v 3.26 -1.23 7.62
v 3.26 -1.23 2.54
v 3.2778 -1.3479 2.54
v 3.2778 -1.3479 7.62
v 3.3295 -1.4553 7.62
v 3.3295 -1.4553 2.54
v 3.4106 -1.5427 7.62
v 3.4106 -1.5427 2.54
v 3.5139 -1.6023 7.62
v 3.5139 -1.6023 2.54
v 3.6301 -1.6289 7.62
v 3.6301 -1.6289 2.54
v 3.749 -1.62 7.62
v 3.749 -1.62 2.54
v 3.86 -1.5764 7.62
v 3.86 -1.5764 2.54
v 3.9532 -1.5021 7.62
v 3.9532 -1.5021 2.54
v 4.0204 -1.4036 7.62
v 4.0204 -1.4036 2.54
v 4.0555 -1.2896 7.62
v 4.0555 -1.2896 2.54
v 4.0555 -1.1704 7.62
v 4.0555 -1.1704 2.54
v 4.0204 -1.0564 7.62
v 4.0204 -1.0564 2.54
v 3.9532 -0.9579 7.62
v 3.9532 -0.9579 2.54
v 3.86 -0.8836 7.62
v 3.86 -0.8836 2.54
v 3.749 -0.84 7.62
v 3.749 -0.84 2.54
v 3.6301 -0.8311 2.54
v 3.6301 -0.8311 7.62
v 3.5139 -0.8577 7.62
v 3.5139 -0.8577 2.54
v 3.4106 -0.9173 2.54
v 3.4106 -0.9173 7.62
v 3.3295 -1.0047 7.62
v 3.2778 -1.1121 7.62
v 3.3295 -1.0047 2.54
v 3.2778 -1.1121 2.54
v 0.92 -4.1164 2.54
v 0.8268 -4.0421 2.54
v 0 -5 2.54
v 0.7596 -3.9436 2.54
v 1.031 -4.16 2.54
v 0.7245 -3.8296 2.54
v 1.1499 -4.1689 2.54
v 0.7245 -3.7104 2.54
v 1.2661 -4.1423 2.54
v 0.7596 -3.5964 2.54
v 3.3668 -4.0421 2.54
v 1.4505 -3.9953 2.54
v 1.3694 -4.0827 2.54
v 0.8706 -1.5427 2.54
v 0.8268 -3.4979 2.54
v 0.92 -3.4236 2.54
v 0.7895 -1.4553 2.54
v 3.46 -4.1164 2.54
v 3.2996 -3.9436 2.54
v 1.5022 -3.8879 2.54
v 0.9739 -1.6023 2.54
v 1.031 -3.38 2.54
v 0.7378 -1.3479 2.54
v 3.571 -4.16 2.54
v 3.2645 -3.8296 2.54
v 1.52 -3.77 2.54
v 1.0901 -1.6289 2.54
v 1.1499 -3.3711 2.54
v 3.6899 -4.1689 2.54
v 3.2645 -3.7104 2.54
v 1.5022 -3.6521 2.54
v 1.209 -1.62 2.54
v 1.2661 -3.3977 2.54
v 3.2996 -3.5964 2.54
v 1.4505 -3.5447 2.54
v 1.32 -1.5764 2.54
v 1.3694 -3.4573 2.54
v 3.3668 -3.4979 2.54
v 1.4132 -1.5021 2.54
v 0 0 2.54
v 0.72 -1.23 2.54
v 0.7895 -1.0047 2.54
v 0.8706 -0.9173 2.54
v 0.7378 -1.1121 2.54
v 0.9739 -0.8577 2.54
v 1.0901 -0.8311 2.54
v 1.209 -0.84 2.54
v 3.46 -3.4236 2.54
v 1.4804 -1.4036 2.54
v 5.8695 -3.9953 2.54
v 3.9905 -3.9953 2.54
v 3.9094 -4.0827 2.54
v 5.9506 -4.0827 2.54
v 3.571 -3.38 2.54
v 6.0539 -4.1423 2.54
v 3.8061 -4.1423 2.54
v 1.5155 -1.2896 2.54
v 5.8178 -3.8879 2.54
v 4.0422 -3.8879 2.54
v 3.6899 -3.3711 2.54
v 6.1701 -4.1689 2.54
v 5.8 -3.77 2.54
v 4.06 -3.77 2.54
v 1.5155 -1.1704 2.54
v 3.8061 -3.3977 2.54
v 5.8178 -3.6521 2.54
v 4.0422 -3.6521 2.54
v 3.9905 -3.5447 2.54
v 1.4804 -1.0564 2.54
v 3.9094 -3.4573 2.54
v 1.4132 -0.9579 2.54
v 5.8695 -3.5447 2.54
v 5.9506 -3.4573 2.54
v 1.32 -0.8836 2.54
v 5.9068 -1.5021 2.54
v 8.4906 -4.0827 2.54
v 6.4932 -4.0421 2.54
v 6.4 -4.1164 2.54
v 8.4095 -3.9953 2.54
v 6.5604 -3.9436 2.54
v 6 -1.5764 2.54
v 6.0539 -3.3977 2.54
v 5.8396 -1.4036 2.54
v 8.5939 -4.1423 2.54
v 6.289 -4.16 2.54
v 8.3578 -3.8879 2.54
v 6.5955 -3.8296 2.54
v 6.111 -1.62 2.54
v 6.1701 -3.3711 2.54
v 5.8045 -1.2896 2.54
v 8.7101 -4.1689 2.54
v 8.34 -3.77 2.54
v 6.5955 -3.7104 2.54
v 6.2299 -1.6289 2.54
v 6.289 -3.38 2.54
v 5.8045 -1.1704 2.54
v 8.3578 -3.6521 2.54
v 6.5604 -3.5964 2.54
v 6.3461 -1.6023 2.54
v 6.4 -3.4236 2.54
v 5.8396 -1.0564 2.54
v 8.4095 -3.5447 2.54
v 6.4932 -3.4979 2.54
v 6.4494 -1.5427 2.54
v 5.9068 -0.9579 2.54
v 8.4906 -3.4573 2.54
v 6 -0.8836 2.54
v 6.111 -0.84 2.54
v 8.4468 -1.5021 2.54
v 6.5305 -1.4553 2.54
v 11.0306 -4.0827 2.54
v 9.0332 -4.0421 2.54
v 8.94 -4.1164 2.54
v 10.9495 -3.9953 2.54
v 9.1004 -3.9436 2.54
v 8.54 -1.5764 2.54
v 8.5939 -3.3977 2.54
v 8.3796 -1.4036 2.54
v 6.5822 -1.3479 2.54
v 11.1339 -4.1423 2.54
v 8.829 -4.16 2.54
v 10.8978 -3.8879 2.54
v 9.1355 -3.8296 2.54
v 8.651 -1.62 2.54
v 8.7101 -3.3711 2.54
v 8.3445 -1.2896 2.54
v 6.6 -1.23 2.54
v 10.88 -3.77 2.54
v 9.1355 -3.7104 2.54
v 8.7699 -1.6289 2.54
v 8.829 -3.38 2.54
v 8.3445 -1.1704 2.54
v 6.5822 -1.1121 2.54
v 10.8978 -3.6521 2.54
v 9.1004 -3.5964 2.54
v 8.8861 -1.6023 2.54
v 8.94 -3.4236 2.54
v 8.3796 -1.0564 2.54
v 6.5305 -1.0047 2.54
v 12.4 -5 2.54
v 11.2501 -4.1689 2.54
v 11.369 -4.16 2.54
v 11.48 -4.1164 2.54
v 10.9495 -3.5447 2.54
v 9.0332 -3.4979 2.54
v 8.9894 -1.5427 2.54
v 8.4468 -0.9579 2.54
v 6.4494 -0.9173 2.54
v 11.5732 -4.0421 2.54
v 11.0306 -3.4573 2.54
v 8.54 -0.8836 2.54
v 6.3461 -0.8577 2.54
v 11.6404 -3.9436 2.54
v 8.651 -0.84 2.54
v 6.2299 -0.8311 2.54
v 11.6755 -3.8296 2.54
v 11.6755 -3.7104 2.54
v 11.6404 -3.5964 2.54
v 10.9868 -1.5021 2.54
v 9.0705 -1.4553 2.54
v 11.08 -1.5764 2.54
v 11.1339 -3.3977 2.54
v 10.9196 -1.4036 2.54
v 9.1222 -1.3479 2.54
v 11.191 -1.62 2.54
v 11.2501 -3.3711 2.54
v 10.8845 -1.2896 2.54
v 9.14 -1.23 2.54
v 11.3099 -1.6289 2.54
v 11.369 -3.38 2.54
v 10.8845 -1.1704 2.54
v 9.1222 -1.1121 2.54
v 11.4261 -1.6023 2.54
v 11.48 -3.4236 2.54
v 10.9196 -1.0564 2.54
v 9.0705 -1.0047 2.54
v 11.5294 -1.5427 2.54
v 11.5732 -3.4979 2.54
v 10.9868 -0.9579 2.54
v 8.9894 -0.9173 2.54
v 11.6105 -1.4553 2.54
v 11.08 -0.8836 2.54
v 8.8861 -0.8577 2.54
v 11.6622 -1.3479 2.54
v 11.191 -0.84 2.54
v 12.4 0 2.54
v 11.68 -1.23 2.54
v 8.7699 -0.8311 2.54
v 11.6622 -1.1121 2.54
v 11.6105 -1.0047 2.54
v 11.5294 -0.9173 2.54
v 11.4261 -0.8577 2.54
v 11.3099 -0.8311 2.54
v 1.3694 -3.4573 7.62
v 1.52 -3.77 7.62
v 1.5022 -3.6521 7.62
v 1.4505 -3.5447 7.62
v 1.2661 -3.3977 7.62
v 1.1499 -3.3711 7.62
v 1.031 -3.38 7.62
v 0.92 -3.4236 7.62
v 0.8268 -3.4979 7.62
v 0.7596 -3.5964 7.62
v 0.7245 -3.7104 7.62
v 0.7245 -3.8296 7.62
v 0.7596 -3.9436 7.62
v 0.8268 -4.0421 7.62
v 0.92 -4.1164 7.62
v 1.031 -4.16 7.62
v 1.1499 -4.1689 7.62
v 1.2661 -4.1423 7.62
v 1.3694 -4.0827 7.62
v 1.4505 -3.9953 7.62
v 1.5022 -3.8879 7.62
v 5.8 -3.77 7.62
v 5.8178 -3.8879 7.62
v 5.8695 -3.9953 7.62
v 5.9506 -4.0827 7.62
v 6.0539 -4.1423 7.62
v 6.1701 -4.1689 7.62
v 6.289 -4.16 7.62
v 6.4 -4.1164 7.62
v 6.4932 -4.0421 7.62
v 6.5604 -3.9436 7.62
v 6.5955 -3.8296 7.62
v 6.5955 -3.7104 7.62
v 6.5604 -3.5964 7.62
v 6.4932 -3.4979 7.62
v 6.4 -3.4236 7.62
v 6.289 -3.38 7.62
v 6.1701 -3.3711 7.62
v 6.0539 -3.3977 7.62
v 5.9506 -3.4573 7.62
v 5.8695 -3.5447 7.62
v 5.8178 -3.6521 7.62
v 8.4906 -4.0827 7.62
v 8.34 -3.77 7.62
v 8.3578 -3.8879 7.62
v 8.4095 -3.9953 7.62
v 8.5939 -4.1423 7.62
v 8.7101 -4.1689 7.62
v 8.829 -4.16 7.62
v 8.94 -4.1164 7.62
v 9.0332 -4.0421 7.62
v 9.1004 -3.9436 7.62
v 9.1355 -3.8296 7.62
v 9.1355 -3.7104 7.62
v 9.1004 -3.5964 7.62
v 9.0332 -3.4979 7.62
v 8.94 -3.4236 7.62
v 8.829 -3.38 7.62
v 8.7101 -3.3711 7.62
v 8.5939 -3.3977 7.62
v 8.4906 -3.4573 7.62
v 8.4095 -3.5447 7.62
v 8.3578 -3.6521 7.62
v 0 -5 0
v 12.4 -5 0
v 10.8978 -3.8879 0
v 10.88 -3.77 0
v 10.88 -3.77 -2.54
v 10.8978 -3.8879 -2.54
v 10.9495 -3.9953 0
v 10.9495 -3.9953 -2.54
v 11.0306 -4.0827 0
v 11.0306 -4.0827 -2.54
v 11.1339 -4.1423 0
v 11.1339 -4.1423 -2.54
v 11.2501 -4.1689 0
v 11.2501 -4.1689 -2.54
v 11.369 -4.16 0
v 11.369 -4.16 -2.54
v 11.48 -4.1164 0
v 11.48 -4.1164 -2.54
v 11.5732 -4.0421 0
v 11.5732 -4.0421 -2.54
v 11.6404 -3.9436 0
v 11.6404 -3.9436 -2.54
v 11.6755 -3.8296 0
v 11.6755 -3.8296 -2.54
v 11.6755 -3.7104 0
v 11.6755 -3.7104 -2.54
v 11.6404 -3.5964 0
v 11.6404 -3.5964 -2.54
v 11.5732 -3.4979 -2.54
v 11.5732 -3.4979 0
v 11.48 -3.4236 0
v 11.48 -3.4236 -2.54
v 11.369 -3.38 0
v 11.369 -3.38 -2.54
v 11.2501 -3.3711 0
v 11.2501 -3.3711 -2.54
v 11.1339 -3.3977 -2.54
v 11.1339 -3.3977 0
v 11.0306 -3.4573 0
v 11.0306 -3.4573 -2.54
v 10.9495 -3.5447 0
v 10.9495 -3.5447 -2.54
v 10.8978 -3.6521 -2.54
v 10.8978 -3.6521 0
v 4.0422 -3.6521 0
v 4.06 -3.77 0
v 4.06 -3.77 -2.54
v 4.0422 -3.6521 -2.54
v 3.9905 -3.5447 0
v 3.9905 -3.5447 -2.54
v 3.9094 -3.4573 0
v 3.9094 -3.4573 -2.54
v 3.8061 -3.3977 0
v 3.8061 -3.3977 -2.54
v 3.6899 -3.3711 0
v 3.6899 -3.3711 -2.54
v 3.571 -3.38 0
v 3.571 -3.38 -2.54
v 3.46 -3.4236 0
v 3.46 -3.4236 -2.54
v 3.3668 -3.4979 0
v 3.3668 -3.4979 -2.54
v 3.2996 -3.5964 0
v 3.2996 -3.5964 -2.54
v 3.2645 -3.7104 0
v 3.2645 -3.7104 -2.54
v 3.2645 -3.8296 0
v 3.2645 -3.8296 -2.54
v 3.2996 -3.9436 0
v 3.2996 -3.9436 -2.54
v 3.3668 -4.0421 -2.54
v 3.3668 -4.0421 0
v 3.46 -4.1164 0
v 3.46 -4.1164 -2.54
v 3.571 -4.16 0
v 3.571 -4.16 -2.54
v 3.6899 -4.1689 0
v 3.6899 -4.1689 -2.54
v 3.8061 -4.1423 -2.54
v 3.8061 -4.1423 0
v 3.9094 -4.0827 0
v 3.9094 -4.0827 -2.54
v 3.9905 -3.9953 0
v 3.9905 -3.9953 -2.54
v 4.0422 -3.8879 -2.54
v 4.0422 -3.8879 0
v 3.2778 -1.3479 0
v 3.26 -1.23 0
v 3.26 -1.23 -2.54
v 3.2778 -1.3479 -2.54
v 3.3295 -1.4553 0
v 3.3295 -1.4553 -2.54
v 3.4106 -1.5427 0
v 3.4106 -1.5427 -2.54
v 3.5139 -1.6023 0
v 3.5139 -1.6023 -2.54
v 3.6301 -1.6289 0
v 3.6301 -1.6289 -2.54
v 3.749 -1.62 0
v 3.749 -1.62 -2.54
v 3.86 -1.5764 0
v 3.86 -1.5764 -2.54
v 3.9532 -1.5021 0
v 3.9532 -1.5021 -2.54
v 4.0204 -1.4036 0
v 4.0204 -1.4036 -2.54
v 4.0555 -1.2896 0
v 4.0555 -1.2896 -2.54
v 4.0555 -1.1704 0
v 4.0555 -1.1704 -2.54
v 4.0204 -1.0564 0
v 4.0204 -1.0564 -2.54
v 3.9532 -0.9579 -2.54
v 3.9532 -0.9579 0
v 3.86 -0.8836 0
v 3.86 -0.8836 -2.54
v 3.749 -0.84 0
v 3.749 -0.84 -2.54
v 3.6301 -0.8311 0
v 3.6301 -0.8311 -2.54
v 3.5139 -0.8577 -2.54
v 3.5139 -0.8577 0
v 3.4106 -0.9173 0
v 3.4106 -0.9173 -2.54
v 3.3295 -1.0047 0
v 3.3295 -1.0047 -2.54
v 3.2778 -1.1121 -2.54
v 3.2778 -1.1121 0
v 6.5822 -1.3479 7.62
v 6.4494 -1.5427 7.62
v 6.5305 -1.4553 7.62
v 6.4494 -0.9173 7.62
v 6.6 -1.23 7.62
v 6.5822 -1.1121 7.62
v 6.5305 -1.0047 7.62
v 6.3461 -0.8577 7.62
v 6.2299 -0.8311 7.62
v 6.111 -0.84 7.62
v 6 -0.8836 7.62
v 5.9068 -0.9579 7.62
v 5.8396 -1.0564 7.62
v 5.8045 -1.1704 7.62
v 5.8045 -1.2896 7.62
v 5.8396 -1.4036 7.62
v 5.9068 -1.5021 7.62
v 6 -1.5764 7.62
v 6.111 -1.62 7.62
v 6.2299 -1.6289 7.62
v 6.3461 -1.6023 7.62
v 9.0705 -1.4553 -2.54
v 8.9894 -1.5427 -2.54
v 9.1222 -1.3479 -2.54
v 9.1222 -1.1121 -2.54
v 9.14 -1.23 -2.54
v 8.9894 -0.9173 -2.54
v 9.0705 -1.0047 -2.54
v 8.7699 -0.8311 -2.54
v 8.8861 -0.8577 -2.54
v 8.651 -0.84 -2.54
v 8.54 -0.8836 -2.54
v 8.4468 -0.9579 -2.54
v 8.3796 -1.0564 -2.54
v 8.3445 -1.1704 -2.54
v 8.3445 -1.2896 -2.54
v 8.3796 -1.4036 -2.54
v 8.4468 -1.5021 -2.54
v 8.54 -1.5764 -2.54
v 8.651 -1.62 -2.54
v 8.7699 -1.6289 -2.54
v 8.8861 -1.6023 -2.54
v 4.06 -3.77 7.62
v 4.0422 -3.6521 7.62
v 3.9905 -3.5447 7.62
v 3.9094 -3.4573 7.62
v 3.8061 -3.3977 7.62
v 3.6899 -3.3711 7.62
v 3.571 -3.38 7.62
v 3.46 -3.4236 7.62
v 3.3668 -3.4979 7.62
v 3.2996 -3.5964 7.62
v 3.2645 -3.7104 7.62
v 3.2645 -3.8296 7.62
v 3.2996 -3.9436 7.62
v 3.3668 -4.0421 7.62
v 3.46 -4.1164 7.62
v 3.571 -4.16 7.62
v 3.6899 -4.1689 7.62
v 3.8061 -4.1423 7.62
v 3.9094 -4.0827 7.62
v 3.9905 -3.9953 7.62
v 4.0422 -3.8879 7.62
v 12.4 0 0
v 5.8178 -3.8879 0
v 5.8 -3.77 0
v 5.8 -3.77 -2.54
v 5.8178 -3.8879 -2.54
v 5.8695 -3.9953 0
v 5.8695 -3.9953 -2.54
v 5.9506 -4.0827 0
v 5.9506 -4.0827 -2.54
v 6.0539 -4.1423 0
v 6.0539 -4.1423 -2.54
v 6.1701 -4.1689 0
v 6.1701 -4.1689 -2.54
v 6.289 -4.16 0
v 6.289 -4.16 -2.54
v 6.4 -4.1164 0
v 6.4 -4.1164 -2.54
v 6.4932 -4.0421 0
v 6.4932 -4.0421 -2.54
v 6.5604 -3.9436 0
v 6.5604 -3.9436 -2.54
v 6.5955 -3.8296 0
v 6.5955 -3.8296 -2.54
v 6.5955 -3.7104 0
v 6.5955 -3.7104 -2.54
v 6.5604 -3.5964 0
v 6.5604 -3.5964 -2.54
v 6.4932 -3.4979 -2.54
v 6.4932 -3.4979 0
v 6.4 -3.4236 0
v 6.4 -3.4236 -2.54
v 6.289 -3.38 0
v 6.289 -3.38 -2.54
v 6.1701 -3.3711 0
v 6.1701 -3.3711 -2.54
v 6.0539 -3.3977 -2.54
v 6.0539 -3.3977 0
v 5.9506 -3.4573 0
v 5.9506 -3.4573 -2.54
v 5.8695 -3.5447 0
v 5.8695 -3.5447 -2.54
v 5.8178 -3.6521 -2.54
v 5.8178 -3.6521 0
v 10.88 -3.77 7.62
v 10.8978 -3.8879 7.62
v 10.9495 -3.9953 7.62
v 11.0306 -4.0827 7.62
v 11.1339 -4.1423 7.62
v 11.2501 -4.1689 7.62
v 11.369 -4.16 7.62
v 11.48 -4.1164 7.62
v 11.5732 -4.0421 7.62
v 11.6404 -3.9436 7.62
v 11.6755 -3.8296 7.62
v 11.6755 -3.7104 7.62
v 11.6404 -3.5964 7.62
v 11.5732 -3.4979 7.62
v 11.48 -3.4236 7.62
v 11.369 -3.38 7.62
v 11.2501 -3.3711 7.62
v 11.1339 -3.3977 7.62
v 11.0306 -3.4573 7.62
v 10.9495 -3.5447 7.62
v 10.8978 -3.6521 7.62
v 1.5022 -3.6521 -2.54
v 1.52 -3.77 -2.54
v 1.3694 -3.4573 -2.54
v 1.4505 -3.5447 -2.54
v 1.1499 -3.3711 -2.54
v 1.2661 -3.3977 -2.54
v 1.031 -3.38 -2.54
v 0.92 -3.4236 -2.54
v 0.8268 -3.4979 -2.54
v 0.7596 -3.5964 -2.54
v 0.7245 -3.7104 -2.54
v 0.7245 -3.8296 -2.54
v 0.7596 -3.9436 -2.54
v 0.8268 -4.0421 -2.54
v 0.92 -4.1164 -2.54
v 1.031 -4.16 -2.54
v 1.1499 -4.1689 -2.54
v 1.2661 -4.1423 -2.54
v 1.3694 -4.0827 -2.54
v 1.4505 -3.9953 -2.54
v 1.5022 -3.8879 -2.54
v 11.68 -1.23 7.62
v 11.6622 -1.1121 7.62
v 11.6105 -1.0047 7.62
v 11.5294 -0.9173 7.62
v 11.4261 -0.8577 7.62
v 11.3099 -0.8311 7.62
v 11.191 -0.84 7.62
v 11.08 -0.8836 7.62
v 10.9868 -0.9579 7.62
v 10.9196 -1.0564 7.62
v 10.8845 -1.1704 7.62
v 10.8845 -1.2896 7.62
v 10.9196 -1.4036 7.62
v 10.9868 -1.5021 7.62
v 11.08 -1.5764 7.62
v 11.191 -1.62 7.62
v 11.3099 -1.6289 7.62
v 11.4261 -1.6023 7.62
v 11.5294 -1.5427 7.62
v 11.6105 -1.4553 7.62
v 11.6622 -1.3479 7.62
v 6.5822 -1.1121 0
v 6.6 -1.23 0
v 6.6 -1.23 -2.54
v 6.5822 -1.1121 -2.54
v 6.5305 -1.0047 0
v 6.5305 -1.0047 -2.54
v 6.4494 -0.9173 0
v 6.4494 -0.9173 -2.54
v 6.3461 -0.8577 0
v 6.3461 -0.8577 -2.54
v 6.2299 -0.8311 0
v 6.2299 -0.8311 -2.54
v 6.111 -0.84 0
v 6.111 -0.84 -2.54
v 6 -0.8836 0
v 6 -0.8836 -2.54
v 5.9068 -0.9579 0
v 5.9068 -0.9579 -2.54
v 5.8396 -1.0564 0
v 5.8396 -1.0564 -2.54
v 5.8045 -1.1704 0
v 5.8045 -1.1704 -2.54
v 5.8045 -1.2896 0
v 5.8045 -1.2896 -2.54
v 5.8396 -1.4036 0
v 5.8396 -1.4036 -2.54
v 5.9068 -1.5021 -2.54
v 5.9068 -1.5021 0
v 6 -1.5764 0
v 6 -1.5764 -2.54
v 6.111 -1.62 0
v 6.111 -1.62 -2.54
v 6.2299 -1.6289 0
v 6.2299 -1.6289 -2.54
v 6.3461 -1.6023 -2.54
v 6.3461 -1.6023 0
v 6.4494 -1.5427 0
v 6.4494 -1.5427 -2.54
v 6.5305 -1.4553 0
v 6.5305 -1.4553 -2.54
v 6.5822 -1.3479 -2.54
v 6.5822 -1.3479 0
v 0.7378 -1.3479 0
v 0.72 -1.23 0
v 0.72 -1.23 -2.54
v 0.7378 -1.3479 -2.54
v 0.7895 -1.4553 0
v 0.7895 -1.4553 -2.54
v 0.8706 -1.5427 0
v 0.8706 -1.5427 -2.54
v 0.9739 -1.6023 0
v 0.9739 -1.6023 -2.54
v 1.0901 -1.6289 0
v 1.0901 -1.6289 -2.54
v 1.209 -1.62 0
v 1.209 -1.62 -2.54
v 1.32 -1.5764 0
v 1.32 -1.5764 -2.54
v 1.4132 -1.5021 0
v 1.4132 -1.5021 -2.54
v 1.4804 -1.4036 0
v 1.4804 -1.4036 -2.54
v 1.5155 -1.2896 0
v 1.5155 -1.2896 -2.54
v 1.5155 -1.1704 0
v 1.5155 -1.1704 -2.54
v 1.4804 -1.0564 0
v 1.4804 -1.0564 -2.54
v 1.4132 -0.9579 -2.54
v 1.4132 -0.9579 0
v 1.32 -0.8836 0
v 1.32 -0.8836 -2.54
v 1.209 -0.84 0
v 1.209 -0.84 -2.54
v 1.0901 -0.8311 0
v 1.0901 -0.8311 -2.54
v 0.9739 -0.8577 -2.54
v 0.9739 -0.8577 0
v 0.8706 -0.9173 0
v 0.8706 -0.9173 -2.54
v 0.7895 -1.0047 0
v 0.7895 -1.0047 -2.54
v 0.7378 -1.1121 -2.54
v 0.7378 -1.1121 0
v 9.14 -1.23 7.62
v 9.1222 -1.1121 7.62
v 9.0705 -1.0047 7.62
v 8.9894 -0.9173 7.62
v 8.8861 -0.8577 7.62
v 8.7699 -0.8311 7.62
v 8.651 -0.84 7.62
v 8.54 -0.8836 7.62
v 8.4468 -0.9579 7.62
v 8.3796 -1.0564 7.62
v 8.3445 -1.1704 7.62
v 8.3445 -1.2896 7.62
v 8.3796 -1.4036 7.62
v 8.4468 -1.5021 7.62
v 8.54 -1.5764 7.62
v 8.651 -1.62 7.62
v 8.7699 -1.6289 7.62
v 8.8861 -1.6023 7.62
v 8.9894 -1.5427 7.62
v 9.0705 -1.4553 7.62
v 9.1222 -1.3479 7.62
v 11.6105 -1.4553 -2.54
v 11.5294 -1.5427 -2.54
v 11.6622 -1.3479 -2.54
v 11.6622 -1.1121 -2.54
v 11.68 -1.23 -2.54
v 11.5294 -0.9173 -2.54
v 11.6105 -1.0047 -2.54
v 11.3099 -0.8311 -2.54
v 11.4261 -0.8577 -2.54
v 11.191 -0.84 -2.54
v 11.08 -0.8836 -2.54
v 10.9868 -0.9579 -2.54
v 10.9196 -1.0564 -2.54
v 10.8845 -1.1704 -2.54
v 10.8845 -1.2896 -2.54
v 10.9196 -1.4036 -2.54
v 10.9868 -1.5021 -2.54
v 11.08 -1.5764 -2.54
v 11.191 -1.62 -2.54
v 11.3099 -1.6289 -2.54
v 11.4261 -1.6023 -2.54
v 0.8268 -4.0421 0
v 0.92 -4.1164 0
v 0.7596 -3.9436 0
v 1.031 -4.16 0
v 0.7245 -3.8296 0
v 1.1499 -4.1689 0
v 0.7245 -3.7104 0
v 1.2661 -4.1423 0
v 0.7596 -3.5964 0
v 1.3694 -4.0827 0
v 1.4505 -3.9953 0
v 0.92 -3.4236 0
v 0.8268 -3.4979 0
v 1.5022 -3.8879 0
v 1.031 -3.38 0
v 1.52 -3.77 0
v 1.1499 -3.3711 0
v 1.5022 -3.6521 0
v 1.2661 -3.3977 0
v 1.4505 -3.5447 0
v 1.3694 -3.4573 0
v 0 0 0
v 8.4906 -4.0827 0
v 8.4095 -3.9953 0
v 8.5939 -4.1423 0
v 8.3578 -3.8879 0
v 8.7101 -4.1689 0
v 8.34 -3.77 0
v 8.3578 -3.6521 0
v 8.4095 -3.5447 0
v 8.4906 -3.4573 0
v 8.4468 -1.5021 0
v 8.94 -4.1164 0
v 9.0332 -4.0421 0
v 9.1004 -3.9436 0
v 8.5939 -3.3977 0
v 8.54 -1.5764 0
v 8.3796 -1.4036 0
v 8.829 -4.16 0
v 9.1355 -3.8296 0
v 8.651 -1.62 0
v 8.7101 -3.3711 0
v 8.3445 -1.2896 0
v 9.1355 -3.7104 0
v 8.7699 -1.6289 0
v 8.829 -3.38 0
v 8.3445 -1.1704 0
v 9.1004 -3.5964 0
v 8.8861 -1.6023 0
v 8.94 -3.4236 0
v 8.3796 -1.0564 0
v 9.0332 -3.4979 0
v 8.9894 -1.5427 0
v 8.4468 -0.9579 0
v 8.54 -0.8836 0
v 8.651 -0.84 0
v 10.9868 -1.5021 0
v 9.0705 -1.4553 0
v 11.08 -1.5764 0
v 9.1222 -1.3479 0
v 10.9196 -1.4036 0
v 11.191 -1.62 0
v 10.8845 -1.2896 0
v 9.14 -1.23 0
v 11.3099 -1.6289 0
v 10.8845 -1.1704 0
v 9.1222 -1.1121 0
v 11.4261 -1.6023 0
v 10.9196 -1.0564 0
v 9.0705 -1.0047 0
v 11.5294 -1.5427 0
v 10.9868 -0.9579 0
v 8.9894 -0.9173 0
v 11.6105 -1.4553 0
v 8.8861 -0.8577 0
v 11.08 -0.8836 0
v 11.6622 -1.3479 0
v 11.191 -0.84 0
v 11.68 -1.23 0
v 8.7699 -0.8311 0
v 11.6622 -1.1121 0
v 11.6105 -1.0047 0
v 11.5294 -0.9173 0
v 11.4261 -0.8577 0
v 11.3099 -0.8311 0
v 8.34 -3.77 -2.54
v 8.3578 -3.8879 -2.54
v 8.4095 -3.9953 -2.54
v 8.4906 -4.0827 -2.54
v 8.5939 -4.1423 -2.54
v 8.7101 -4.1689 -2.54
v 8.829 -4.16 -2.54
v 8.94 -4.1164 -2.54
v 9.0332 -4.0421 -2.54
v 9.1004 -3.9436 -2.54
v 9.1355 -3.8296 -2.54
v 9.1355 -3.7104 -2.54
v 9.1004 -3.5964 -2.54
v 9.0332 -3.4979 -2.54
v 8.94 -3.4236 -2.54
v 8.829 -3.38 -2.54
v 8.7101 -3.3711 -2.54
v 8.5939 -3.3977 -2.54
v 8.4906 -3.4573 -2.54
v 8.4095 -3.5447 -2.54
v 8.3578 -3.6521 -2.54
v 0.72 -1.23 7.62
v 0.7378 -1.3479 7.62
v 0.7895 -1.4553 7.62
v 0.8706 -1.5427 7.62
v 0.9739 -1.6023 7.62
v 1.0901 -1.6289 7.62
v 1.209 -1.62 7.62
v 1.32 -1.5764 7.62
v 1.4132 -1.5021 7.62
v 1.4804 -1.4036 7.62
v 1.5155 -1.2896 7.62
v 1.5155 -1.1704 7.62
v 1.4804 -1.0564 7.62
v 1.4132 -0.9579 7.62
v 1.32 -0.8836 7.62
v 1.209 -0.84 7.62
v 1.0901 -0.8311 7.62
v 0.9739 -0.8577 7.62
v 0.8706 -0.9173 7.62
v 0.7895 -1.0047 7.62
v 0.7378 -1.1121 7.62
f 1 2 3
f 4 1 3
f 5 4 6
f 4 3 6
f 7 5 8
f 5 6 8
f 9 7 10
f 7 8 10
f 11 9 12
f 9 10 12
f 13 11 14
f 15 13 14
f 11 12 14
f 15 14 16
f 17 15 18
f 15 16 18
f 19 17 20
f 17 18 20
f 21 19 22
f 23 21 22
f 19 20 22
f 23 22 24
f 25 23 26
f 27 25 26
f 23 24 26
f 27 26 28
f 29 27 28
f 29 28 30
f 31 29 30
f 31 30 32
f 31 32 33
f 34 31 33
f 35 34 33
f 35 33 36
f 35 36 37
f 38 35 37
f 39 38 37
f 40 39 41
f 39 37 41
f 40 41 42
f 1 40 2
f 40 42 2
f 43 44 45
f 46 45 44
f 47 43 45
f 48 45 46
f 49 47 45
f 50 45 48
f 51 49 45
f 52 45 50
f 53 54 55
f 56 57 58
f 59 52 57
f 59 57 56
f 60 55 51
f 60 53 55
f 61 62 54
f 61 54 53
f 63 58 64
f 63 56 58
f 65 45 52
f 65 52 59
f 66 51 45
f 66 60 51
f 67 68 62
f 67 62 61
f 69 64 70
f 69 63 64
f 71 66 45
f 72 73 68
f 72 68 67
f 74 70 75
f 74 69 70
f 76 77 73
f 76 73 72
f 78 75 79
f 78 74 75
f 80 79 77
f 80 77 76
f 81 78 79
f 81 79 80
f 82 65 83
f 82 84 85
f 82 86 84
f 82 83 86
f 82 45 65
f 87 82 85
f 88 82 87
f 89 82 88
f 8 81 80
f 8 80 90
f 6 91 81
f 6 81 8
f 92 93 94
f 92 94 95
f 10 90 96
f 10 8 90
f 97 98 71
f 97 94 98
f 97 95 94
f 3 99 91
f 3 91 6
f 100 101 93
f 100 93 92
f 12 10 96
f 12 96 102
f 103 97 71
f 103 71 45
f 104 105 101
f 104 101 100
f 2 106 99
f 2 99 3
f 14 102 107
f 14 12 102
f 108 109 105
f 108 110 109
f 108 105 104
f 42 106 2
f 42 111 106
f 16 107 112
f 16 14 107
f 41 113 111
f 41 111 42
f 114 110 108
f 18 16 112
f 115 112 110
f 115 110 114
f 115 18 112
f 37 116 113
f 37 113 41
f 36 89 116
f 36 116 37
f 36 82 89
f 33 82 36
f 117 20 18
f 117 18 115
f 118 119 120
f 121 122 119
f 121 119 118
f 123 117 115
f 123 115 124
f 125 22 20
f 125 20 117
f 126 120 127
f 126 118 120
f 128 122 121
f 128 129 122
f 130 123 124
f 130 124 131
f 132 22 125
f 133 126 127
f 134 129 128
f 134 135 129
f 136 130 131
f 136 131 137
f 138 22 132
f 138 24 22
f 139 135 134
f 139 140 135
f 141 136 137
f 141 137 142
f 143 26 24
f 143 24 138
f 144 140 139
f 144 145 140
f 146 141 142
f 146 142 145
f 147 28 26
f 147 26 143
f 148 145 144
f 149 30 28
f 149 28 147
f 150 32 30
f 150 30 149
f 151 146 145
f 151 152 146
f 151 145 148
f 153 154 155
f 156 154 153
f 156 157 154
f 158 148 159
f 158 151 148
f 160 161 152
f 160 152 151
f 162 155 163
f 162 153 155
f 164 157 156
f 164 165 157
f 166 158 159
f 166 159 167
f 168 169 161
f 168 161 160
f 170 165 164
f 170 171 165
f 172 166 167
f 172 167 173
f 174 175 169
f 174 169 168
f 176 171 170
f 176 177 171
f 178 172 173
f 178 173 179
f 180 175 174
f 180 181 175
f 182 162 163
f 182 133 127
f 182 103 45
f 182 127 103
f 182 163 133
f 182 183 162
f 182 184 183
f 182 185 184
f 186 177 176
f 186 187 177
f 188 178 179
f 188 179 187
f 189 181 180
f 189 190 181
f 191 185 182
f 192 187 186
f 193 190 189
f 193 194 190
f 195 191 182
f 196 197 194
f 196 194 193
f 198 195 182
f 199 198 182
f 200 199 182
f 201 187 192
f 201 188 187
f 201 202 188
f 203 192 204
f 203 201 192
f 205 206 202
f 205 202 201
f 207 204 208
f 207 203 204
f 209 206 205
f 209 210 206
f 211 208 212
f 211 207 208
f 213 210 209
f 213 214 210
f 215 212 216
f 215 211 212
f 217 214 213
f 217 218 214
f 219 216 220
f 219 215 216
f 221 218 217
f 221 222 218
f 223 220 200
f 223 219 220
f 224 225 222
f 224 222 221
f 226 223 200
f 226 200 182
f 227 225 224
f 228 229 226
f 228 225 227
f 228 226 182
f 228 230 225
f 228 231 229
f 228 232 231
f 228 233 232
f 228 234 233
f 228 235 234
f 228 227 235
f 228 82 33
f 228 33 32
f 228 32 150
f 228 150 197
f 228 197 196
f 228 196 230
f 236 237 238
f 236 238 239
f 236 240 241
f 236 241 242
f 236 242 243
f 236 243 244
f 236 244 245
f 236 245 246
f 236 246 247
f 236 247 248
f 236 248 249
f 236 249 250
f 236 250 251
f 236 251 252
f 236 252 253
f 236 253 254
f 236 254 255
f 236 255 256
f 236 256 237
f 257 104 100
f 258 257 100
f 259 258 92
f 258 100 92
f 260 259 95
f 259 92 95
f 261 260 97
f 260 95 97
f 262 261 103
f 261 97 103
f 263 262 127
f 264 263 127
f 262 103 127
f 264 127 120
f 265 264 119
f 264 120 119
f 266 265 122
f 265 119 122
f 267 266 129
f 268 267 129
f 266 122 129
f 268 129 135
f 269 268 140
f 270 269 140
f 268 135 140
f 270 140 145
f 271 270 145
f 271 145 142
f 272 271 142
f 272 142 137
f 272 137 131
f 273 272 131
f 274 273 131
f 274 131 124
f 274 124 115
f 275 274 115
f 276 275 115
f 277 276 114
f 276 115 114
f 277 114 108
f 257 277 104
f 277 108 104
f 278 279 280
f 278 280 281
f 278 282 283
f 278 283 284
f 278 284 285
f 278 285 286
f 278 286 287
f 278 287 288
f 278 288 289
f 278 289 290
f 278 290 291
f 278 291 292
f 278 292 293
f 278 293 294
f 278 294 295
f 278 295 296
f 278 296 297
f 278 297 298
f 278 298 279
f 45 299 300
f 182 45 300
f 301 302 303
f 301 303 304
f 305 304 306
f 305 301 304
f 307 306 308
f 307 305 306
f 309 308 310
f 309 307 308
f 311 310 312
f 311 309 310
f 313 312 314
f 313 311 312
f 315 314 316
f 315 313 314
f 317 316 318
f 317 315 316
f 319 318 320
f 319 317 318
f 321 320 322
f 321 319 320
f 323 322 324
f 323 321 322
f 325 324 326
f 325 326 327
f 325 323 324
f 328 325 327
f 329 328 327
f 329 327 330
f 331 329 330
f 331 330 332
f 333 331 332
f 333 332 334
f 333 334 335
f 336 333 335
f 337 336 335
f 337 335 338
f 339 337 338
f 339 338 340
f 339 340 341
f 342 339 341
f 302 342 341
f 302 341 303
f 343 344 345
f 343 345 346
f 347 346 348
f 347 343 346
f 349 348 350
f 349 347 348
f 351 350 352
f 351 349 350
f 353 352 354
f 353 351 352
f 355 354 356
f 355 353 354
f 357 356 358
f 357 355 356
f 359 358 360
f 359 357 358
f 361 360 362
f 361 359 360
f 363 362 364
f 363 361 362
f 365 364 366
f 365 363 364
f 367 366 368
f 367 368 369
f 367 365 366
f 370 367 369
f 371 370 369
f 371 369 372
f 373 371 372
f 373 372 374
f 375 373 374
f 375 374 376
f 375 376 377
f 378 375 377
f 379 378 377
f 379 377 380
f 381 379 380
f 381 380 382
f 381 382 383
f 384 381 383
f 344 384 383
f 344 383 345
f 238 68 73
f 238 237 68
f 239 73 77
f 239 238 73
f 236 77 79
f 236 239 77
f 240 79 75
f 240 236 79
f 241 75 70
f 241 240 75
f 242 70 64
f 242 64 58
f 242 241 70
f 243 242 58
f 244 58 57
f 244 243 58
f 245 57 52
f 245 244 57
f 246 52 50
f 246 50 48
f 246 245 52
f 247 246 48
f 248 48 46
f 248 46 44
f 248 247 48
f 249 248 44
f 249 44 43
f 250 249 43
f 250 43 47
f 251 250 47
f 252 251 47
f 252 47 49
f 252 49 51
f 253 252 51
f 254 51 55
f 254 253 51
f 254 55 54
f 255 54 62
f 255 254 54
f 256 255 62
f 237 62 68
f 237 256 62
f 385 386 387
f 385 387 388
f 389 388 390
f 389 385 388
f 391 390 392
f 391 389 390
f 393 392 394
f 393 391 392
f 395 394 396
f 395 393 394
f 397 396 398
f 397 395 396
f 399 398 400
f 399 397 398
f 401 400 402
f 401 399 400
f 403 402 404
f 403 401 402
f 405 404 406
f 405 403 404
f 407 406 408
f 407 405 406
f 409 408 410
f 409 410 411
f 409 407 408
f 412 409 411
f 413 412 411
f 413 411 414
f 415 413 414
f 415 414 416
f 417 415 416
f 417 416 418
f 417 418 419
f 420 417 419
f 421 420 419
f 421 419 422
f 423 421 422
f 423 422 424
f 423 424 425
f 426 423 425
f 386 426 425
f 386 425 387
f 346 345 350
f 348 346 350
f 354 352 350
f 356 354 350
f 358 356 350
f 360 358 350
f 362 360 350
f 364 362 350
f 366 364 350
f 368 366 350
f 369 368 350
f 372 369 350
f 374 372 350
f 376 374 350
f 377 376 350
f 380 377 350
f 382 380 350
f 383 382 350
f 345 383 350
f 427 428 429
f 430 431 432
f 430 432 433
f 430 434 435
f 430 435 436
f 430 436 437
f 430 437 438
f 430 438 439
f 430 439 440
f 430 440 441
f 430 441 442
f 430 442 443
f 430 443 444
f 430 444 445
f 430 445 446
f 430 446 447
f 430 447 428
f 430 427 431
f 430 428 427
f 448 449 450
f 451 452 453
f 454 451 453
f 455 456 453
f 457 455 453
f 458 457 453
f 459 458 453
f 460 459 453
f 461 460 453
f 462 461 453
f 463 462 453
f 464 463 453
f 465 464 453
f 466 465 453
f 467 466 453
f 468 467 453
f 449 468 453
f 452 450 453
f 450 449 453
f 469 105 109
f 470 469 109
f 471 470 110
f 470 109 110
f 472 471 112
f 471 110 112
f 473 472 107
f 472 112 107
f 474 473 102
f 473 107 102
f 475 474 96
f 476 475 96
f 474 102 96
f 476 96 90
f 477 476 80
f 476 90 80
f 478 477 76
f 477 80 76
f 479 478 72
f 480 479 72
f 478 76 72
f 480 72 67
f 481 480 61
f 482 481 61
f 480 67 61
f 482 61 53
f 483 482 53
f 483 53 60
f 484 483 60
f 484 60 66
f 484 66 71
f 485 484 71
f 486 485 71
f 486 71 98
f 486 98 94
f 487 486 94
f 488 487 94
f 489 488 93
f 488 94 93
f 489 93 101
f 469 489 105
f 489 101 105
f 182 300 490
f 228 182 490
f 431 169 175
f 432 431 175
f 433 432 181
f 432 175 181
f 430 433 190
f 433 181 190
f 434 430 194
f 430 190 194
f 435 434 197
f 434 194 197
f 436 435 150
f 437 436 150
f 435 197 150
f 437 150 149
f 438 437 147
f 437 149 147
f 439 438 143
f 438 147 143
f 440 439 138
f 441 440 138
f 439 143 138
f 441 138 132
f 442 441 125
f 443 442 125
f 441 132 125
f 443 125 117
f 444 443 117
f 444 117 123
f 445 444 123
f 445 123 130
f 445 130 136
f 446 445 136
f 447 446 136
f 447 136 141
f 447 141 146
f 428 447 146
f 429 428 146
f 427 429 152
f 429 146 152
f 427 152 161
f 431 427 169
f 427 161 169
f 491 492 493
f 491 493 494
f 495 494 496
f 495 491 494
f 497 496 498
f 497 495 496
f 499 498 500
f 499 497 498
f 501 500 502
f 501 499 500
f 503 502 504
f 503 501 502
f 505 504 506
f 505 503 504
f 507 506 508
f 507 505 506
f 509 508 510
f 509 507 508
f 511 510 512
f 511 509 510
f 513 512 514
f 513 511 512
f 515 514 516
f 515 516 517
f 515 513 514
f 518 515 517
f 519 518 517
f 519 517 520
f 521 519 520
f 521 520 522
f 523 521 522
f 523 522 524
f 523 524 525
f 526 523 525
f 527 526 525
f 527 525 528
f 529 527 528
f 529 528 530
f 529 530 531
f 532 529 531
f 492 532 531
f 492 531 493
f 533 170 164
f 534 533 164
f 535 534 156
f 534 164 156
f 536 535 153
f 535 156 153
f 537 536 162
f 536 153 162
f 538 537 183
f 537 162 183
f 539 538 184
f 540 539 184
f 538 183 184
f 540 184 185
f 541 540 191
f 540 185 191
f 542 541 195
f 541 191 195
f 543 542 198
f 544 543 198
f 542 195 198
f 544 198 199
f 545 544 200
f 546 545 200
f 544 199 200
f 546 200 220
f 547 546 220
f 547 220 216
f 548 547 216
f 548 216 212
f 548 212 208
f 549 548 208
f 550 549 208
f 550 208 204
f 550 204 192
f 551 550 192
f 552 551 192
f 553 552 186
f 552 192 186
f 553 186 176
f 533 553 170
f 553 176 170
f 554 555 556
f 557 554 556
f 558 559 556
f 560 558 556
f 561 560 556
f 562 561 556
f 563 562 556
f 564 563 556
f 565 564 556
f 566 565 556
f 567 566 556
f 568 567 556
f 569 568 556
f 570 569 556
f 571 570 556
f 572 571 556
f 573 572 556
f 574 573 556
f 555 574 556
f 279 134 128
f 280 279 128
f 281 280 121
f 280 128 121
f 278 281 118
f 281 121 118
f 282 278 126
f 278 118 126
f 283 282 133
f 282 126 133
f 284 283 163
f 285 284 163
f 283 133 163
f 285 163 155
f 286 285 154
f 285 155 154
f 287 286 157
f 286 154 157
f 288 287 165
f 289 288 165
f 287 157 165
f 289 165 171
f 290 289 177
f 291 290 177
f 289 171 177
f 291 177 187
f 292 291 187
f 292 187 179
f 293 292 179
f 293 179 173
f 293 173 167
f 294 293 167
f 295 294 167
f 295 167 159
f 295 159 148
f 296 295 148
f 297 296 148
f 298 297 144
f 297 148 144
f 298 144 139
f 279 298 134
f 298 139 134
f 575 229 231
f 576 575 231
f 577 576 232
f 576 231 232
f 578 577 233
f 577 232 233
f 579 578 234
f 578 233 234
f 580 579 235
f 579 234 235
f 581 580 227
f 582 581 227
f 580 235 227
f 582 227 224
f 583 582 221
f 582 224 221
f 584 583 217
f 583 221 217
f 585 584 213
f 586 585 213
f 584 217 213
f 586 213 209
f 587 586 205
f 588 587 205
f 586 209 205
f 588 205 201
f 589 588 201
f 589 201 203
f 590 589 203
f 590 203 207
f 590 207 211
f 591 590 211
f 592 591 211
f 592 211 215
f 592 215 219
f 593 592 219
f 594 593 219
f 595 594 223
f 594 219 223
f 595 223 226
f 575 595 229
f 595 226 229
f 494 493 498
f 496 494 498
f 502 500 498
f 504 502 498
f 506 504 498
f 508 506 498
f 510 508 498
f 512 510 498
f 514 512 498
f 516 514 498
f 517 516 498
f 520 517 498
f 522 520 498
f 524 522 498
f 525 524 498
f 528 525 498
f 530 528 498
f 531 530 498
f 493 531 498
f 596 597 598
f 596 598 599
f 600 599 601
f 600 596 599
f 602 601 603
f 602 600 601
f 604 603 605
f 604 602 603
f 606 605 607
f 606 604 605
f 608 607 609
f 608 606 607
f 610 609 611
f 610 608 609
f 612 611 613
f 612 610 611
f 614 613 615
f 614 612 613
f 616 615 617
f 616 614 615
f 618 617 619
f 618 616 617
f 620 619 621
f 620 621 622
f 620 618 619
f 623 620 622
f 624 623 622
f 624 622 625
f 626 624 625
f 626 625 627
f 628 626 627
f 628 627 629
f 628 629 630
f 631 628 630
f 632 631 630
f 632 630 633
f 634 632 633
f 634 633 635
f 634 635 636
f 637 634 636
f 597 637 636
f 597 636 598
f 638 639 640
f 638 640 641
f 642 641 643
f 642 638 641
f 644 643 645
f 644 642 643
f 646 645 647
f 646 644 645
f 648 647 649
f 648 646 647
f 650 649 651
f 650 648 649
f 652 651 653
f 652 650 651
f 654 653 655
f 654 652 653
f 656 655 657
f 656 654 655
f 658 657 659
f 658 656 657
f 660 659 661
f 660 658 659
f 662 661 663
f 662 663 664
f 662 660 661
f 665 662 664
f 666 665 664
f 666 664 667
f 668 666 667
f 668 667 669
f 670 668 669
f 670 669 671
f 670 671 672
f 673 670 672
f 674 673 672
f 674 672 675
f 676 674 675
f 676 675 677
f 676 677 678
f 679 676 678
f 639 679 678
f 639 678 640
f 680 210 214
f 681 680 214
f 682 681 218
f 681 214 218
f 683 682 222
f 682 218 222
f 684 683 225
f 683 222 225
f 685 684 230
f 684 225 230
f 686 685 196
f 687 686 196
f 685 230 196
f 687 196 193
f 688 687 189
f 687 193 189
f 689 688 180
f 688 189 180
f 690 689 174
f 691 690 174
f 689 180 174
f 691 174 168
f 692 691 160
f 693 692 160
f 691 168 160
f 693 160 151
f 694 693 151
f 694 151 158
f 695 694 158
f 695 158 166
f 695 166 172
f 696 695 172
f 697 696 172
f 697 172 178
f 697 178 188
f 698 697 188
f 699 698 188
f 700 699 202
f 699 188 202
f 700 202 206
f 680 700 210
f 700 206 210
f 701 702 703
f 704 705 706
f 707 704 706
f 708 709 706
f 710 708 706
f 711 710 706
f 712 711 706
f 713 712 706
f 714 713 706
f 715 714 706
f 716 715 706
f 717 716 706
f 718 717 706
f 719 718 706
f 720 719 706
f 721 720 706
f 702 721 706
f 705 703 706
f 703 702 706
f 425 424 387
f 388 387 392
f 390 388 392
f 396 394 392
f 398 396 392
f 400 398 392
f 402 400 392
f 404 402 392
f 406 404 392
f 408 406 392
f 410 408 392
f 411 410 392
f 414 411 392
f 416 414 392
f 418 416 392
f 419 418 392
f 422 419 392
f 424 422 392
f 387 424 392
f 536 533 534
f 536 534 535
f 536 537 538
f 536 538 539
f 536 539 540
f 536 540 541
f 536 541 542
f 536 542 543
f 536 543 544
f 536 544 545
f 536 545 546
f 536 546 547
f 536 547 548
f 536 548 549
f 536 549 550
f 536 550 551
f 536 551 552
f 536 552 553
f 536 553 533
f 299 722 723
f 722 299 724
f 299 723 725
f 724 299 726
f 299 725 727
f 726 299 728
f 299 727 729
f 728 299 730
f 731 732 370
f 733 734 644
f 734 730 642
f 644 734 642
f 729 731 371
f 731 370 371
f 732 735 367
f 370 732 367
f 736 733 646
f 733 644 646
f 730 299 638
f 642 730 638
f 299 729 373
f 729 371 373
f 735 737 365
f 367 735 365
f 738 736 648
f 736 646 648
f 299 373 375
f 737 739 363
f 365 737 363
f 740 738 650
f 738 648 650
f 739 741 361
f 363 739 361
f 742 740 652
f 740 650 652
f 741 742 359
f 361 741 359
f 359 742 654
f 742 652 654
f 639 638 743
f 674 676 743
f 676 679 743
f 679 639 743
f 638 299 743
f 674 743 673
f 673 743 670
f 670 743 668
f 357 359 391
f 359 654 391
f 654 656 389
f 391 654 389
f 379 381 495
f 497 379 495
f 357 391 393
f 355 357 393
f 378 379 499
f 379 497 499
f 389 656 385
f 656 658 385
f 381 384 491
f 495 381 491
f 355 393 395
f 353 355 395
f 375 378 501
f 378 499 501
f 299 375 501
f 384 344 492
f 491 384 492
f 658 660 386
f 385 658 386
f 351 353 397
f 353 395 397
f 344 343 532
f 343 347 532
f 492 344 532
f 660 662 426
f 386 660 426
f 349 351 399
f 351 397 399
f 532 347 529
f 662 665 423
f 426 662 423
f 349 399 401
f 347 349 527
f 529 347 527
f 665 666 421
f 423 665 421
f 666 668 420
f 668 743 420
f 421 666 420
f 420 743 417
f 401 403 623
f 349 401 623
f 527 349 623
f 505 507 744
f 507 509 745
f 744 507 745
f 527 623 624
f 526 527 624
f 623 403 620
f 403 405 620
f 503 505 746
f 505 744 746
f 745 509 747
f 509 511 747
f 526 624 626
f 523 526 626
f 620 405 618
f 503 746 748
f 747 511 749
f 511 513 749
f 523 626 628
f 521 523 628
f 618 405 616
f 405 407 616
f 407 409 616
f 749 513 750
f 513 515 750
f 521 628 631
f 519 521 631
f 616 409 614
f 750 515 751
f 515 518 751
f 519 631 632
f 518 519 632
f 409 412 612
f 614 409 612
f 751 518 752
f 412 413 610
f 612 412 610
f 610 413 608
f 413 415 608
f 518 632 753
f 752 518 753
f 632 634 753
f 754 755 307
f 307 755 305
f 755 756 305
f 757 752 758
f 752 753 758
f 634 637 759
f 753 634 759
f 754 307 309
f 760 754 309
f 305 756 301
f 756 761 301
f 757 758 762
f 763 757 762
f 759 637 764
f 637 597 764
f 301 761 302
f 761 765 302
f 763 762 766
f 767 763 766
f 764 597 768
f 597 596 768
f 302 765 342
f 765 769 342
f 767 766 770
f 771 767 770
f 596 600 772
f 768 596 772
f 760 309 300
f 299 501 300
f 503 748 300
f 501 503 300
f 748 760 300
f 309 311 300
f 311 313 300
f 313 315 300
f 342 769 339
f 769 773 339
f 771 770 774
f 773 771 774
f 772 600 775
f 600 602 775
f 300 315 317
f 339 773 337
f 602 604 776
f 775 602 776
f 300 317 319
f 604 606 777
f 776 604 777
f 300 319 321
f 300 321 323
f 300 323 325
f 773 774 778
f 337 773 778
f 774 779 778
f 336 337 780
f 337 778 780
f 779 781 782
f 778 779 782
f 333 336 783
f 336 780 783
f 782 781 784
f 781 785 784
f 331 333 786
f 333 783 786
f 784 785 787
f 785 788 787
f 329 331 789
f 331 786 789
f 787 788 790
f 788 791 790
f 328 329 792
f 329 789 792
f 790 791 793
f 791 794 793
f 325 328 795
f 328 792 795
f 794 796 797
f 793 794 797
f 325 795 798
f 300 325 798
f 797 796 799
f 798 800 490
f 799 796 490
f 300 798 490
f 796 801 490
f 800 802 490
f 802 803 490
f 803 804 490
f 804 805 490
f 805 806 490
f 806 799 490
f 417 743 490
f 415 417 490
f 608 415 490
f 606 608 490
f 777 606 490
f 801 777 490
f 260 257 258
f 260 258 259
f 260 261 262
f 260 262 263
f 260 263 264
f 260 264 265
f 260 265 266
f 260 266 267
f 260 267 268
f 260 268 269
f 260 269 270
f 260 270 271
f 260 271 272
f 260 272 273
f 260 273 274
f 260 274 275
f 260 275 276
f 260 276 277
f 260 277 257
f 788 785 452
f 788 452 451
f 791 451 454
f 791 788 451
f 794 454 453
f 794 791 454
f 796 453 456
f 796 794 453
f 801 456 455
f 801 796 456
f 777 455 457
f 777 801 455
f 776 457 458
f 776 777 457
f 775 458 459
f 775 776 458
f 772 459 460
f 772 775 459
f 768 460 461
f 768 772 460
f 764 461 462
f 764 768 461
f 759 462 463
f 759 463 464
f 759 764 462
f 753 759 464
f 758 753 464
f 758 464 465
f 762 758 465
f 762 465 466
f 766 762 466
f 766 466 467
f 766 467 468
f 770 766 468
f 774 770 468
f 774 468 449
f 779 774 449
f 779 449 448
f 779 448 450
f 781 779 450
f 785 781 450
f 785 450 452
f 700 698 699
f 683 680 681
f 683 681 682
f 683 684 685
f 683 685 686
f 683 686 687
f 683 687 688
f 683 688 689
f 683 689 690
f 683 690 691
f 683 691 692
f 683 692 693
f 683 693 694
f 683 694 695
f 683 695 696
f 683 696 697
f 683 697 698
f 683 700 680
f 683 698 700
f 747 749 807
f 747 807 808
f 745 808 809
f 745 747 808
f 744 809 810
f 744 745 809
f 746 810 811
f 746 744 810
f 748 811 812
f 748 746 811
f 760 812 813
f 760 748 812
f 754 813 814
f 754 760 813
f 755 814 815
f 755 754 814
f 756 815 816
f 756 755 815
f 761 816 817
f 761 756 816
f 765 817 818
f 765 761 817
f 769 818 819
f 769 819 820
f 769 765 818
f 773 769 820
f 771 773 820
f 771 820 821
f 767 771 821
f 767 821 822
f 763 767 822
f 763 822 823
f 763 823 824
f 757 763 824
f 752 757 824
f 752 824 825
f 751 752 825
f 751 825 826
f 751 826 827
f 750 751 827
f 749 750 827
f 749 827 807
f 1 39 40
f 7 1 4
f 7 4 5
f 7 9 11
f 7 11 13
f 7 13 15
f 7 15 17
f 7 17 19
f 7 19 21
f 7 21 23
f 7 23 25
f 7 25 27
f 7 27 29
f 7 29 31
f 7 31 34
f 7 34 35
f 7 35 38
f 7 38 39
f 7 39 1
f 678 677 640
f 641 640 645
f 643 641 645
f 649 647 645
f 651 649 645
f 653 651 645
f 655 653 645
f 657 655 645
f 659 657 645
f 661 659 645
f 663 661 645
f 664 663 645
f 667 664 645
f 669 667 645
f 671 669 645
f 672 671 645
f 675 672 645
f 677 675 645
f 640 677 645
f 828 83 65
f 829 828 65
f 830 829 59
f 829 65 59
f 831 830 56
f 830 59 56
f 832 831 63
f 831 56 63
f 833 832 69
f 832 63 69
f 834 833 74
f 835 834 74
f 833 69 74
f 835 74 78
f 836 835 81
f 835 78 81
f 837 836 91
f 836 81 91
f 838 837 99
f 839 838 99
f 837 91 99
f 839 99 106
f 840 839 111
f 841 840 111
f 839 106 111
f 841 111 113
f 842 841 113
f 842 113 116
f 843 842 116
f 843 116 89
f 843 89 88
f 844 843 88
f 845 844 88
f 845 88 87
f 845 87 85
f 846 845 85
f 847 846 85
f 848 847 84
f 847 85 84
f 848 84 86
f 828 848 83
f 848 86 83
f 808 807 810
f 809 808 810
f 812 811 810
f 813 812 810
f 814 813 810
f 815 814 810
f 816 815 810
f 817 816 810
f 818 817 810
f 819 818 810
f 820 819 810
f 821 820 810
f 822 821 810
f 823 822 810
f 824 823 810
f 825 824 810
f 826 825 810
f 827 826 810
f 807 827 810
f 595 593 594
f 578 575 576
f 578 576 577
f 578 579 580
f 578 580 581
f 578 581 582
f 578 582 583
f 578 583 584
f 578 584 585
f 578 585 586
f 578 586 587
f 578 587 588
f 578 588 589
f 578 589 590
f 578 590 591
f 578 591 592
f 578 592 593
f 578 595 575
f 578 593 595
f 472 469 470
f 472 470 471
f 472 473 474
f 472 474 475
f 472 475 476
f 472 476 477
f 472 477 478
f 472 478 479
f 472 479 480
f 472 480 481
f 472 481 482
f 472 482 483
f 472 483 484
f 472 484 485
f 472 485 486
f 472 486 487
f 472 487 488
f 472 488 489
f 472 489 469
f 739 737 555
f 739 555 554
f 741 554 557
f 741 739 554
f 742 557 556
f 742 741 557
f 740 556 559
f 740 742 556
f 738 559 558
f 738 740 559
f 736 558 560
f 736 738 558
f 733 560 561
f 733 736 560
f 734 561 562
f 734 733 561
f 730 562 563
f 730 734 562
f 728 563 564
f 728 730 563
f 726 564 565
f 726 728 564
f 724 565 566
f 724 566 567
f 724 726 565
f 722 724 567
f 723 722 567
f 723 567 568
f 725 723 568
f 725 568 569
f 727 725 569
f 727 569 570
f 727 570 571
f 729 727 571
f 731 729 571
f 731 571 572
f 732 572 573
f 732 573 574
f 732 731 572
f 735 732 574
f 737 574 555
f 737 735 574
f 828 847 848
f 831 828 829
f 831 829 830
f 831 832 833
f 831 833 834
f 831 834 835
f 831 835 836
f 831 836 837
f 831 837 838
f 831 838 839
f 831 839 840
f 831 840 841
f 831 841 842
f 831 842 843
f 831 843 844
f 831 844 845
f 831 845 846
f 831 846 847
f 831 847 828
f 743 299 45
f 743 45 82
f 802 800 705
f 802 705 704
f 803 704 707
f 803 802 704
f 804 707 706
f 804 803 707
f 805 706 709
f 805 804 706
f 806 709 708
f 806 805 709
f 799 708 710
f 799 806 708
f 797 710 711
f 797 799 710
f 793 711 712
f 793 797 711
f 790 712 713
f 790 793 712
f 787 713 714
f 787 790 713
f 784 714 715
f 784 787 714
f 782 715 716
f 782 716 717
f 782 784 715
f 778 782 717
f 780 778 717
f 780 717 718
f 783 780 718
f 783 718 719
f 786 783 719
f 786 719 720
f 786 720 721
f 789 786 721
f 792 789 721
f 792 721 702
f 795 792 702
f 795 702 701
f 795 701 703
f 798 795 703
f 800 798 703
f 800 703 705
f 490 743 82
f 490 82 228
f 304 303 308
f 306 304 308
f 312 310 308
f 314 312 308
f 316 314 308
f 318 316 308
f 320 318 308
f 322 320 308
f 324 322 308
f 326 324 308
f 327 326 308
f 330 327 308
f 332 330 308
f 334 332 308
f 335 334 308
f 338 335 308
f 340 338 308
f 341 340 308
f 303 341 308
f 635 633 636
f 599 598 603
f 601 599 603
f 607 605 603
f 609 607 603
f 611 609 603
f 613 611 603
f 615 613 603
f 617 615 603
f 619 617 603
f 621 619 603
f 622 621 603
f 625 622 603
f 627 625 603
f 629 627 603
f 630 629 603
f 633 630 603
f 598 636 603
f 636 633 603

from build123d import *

# Parameters (mm, degrees)
SKETCH_1_W      = 12.4
SKETCH_1_H      = 5
EXTRUDE_1_DEPTH = 2.54
SKETCH_2_R      = 0.4
EXTRUDE_2_DEPTH = 5.08


with BuildPart() as part:
    # 草图1 → 凸台-拉伸1 (new body)
    with BuildSketch(Plane.XY):
        with Locations((6.2, -2.5)):
            Rectangle(SKETCH_1_W, SKETCH_1_H)
    extrude(amount=EXTRUDE_1_DEPTH)

    # 草图2 → 凸台-拉伸2 (add, symmetric)
    with BuildSketch(Plane.XY.offset(2.54)):
        with Locations((6.2, -1.23)):
            Circle(SKETCH_2_R)
        with Locations((8.74, -1.23)):
            Circle(SKETCH_2_R)
        with Locations((11.28, -1.23)):
            Circle(SKETCH_2_R)
        with Locations(Location((1.12, -1.23, 0), (0, 0, 180))):
            Circle(SKETCH_2_R)
        with Locations(Location((3.66, -1.23, 0), (0, 0, 180))):
            Circle(SKETCH_2_R)
        with Locations(Location((11.28, -3.77, 0), (0, 0, 180))):
            Circle(SKETCH_2_R)
        with Locations(Location((8.74, -3.77, 0), (0, 0, 180))):
            Circle(SKETCH_2_R)
        with Locations(Location((6.2, -3.77, 0), (0, 0, 180))):
            Circle(SKETCH_2_R)
        with Locations((3.66, -3.77)):
            Circle(SKETCH_2_R)
        with Locations((1.12, -3.77)):
            Circle(SKETCH_2_R)
    extrude(amount=EXTRUDE_2_DEPTH, both=True)


solid = part.part
